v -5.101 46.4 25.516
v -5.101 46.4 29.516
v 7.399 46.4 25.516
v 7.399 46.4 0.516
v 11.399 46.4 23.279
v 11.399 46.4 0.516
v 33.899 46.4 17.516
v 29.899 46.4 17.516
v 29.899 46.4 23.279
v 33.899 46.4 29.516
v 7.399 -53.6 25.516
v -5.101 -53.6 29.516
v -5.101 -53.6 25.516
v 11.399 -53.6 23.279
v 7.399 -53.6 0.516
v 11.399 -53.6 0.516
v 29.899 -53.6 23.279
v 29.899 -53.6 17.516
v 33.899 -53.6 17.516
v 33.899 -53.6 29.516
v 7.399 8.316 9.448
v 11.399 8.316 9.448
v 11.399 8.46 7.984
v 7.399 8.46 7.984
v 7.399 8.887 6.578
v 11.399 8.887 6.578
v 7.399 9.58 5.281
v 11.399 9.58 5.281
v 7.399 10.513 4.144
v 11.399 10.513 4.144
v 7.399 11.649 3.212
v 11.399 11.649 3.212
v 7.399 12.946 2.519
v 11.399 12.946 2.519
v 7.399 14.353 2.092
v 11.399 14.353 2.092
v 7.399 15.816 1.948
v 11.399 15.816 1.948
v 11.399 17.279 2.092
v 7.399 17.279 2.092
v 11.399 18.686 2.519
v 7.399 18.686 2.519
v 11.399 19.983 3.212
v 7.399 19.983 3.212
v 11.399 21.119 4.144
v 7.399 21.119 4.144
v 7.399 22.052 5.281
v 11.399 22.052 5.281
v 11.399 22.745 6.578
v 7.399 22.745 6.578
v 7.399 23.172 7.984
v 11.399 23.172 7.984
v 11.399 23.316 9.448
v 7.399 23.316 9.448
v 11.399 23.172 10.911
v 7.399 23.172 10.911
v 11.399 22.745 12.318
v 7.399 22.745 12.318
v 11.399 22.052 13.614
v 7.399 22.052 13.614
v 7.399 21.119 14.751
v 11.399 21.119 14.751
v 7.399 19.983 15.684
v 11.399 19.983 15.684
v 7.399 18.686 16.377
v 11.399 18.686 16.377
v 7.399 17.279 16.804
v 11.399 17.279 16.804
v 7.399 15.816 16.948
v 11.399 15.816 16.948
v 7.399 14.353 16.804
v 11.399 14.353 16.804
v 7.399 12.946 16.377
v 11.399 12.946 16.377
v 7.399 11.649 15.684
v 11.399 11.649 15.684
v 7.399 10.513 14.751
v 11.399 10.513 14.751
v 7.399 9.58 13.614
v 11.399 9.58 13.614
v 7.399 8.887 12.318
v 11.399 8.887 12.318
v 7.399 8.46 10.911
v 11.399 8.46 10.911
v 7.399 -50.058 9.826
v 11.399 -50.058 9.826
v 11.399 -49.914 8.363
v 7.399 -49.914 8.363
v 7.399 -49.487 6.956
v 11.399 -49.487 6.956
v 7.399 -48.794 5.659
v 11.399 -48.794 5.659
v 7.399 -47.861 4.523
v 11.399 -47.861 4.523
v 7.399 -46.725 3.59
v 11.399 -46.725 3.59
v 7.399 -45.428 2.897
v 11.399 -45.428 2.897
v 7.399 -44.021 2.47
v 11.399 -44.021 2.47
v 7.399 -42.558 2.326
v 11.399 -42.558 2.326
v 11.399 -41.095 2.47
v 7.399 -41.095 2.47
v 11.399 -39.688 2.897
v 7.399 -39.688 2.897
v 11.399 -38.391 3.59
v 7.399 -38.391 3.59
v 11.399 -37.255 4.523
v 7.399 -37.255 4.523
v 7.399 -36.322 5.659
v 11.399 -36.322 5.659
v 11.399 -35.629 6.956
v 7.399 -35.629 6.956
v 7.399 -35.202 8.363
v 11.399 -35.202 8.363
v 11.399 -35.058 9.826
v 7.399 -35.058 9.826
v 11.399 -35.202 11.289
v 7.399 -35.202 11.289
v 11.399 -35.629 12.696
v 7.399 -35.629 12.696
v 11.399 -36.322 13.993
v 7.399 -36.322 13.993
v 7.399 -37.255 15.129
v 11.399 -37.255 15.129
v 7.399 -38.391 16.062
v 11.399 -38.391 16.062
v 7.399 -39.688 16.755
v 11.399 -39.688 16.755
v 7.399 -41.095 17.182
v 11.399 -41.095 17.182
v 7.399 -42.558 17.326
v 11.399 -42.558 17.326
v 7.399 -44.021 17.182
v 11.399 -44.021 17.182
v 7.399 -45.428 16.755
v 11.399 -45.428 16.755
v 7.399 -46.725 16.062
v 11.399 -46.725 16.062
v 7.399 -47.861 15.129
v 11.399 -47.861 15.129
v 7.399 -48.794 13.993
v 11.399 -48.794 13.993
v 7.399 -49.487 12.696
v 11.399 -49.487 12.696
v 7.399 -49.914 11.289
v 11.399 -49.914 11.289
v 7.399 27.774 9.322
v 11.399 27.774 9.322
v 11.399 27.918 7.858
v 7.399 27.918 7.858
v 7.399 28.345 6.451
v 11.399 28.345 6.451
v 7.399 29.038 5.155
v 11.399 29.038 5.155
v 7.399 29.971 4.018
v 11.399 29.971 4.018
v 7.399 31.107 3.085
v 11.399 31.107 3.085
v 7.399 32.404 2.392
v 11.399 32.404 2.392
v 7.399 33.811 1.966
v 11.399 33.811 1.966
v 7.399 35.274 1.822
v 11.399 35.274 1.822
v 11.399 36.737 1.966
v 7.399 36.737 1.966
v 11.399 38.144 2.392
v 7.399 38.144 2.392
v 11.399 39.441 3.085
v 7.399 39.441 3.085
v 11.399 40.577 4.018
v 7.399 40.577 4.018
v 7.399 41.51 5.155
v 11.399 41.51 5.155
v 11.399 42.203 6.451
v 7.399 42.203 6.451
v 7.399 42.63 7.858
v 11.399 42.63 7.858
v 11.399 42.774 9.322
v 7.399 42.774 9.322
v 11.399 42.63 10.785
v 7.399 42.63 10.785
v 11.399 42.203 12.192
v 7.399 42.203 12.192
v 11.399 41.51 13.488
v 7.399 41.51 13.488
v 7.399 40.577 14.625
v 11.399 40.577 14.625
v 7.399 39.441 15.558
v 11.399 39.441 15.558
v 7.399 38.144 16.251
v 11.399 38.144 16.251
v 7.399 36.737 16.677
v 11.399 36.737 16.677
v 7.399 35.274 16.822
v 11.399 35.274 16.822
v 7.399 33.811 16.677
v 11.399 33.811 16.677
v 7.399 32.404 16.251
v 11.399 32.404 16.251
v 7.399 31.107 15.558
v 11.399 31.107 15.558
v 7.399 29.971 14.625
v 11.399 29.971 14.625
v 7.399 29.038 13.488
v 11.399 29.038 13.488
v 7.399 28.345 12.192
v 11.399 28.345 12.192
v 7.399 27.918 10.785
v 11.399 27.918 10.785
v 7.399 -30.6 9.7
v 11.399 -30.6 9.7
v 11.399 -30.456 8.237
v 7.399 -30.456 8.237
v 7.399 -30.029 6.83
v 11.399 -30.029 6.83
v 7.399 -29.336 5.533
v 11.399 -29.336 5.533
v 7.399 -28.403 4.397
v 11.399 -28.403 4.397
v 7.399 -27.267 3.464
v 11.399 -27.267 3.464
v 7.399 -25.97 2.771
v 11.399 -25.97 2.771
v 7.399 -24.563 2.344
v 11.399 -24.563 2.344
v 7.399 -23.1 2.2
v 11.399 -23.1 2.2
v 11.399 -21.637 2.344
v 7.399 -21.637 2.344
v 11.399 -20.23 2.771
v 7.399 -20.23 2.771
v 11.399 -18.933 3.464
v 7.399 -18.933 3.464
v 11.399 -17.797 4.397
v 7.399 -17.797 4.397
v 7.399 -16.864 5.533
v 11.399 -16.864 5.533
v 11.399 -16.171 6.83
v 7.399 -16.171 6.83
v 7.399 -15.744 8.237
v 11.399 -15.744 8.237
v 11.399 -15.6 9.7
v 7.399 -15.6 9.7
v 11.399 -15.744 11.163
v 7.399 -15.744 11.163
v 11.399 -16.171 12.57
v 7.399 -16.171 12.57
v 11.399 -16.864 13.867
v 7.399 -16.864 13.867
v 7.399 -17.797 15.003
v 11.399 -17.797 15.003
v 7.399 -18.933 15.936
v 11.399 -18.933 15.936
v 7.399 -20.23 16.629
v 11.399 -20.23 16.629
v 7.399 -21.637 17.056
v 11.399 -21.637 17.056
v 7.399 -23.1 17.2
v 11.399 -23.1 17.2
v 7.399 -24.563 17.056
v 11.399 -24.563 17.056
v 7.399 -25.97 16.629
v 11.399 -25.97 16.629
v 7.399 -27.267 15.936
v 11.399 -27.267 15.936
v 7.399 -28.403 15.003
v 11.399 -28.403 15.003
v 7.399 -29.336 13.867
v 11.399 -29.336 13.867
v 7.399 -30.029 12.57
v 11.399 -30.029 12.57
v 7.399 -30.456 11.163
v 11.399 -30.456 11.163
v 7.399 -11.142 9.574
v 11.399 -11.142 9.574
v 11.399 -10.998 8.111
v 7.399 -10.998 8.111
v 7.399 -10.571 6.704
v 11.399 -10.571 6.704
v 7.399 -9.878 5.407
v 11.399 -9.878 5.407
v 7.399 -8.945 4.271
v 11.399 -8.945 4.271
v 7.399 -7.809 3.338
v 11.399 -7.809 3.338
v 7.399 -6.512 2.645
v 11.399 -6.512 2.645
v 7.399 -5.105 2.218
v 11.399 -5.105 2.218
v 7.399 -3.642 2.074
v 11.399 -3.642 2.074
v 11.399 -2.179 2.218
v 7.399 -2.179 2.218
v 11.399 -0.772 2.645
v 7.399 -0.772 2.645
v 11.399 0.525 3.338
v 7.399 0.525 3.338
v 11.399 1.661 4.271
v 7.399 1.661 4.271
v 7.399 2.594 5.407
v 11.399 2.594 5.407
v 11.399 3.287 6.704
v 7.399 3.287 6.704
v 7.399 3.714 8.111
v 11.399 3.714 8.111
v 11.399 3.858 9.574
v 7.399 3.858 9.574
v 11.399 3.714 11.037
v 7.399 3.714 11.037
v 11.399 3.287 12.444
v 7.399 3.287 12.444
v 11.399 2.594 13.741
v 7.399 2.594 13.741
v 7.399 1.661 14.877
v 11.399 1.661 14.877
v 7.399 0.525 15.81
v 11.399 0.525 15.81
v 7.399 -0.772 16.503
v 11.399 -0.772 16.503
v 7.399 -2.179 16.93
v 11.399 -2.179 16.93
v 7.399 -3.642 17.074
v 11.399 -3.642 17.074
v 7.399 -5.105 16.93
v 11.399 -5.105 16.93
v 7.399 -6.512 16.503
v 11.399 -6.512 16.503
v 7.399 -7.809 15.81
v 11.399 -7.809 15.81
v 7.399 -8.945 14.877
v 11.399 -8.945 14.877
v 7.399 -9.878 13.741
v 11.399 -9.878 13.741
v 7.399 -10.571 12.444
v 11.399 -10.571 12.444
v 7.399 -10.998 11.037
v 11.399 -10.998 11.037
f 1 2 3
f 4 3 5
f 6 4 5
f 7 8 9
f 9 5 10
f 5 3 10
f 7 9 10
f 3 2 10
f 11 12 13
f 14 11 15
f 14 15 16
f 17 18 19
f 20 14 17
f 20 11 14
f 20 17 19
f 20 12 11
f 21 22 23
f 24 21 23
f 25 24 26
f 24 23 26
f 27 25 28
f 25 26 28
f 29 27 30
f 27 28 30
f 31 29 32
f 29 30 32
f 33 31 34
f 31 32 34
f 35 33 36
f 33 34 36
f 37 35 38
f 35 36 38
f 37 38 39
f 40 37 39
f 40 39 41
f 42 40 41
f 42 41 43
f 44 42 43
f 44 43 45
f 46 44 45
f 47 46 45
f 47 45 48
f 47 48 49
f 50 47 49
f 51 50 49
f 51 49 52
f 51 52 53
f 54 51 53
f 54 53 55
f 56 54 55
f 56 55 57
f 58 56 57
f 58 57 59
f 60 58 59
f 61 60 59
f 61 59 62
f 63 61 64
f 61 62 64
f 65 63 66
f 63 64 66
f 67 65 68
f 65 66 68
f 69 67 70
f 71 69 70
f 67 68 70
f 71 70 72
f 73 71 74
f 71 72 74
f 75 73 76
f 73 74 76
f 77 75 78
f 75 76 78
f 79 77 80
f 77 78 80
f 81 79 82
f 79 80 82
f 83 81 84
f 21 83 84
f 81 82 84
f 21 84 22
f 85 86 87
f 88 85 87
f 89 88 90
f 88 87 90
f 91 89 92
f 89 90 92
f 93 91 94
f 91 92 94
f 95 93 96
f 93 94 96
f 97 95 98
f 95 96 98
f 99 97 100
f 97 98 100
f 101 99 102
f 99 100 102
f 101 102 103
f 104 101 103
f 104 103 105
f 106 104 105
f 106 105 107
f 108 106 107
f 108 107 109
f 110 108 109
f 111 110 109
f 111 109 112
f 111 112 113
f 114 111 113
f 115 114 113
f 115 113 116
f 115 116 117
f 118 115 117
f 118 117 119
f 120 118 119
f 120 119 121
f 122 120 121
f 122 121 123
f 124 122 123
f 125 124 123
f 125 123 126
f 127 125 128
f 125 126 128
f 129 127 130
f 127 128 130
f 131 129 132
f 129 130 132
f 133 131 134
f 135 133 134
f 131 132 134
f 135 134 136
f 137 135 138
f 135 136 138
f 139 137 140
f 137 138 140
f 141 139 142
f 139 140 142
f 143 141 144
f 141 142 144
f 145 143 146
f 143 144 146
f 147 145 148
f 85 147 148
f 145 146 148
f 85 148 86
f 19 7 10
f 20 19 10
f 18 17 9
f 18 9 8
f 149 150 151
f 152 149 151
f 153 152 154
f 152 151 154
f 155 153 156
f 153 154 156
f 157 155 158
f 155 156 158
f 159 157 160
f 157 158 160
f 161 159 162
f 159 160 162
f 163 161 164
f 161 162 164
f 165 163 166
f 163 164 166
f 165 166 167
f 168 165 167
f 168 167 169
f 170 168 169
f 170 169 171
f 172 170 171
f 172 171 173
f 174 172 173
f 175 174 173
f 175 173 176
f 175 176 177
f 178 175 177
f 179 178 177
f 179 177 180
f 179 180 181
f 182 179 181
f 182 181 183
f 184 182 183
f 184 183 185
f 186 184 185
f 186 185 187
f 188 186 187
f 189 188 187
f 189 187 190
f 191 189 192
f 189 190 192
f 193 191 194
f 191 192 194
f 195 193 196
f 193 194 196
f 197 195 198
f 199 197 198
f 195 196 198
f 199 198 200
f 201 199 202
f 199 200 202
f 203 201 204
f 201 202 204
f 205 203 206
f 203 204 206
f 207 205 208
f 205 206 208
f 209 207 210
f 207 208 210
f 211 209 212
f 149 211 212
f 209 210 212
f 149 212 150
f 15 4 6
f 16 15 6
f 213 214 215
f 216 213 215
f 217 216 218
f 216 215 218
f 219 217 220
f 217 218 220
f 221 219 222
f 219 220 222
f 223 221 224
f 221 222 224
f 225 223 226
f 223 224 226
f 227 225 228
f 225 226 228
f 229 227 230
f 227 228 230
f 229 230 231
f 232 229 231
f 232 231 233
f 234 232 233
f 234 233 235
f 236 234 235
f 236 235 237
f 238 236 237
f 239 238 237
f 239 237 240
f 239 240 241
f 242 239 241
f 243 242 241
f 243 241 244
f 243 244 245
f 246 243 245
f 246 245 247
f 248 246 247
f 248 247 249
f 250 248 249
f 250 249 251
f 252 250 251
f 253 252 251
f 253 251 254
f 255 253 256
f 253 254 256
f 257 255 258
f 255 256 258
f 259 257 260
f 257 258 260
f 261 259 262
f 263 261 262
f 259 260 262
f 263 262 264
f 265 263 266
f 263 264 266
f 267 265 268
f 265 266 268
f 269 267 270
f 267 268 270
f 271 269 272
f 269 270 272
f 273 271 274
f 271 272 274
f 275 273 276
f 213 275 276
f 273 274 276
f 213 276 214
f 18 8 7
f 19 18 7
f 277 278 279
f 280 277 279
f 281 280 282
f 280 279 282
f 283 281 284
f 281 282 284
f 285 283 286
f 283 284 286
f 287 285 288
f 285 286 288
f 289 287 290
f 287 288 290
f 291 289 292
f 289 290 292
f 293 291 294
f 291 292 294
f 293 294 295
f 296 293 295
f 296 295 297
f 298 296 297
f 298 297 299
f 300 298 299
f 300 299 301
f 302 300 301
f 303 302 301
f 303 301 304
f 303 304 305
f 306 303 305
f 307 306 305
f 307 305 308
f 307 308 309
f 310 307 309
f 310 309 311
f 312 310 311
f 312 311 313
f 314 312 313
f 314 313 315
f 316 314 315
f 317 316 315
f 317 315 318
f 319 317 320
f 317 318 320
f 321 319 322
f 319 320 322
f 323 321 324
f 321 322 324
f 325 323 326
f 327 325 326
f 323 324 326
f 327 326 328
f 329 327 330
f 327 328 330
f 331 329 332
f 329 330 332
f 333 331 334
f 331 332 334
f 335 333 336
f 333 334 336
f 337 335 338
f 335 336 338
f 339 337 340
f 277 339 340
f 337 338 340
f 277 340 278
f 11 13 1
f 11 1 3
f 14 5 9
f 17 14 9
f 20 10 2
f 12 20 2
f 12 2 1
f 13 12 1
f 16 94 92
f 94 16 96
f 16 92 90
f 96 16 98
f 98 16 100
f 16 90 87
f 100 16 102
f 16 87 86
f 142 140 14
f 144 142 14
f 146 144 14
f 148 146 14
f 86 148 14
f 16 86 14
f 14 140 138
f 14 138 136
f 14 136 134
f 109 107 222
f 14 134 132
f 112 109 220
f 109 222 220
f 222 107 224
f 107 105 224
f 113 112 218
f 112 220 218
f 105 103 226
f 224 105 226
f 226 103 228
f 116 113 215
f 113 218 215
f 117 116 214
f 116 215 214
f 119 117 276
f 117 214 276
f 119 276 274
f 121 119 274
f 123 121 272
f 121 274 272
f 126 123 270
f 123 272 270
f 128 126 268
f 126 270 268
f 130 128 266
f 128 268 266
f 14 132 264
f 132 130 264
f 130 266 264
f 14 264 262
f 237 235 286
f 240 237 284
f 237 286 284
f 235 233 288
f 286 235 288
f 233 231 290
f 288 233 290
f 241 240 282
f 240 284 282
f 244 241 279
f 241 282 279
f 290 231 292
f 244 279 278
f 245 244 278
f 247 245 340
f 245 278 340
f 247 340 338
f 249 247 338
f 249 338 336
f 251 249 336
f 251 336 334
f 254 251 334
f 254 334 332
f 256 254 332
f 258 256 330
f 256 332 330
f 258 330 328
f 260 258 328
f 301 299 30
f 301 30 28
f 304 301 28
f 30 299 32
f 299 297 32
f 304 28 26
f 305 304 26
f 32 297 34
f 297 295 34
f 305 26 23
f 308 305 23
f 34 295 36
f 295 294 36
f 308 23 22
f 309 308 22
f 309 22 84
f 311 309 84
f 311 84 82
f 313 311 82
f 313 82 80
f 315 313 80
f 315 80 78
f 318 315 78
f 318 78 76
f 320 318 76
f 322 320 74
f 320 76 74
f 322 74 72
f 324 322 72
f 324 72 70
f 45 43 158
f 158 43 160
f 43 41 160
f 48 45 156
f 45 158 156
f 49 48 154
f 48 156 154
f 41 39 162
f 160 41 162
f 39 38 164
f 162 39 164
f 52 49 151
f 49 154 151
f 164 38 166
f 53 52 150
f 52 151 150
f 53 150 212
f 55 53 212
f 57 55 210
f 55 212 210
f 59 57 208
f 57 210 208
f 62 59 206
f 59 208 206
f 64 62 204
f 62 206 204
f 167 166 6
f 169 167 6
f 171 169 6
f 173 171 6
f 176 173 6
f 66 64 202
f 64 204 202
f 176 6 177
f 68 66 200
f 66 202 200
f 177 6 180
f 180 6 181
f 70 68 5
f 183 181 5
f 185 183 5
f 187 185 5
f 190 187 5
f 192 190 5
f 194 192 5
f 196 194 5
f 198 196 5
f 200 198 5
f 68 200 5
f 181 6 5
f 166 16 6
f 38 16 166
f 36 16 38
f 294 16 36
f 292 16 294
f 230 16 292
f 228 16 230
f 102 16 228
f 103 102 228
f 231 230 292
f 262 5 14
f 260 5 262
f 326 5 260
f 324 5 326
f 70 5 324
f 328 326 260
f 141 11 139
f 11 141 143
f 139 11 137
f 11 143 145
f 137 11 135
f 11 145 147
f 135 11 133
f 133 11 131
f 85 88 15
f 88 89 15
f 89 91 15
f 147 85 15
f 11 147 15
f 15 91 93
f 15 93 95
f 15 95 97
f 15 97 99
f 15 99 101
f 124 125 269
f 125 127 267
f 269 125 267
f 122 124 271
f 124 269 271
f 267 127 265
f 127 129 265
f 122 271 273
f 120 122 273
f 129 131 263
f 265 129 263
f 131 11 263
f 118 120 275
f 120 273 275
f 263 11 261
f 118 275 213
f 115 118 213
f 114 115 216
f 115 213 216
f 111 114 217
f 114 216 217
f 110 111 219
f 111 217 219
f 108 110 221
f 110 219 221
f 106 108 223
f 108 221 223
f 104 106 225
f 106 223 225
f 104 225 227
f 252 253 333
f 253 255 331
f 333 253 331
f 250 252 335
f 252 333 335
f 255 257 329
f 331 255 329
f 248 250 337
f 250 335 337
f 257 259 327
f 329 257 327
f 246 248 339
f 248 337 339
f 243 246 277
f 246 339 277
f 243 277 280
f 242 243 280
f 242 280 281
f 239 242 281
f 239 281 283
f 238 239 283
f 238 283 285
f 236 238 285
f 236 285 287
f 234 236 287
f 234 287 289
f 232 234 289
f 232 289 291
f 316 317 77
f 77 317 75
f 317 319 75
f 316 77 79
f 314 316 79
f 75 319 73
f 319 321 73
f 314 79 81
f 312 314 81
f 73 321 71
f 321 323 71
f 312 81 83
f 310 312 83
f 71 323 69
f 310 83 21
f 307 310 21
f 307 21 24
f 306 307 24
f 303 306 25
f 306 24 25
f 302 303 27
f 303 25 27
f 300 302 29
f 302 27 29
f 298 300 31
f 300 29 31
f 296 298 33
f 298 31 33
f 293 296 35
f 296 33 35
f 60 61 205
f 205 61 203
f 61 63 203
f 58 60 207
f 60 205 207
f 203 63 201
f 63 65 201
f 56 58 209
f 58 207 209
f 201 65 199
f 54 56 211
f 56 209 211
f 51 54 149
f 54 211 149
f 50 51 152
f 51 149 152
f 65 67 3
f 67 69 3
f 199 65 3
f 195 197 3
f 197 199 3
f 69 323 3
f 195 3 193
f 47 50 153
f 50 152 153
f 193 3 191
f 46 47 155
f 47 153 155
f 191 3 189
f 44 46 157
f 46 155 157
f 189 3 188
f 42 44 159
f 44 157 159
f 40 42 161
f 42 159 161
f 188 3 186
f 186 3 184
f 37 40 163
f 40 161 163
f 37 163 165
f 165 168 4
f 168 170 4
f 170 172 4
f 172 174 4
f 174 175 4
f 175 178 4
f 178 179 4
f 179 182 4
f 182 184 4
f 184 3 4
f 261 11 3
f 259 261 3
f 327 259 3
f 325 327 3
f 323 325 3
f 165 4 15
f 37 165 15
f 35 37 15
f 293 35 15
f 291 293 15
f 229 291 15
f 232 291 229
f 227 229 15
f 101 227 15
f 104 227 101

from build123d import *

# Parameters (mm, degrees)
F1_DEPTH = 100
F4_D     = 15


with BuildPart() as f1:
    # F0 (on Front) → F1 (new body)
    with BuildSketch(Plane.XZ):
        Polygon((29.8991873538, 23.8793696377), (29.8991873538, 18.1159283534), (33.8991873538, 18.1159283534), (33.8991873538, 26.1159283534), (33.8991873538, 30.1159283534), (-5.1008126462, 30.1159283534), (-5.1008126462, 26.1159283534), (7.3991873538, 26.1159283534), (7.3991873538, 1.1159283534), (11.3991873538, 1.1159283534), (11.3991873538, 23.8793696377), align=None)
    extrude(amount=F1_DEPTH)


with BuildPart() as f1_1:
    # F2: moved
    add(f1.part.moved(Location((0, 46.4, -0.6))))

    # F4 (through all)
    with Locations(Plane(origin=(0, 0, 0), x_dir=(0, 1, 0), z_dir=(-1, 0, 0))):
        with Locations((35.2738084853, -9.32151151), (15.8158723235, -9.44767434), (-3.6420638382, -9.57383717), (-23.1, -9.7), (-42.5579361618, -9.82616283)):
            Hole(F4_D / 2)


solid = f1_1.part
